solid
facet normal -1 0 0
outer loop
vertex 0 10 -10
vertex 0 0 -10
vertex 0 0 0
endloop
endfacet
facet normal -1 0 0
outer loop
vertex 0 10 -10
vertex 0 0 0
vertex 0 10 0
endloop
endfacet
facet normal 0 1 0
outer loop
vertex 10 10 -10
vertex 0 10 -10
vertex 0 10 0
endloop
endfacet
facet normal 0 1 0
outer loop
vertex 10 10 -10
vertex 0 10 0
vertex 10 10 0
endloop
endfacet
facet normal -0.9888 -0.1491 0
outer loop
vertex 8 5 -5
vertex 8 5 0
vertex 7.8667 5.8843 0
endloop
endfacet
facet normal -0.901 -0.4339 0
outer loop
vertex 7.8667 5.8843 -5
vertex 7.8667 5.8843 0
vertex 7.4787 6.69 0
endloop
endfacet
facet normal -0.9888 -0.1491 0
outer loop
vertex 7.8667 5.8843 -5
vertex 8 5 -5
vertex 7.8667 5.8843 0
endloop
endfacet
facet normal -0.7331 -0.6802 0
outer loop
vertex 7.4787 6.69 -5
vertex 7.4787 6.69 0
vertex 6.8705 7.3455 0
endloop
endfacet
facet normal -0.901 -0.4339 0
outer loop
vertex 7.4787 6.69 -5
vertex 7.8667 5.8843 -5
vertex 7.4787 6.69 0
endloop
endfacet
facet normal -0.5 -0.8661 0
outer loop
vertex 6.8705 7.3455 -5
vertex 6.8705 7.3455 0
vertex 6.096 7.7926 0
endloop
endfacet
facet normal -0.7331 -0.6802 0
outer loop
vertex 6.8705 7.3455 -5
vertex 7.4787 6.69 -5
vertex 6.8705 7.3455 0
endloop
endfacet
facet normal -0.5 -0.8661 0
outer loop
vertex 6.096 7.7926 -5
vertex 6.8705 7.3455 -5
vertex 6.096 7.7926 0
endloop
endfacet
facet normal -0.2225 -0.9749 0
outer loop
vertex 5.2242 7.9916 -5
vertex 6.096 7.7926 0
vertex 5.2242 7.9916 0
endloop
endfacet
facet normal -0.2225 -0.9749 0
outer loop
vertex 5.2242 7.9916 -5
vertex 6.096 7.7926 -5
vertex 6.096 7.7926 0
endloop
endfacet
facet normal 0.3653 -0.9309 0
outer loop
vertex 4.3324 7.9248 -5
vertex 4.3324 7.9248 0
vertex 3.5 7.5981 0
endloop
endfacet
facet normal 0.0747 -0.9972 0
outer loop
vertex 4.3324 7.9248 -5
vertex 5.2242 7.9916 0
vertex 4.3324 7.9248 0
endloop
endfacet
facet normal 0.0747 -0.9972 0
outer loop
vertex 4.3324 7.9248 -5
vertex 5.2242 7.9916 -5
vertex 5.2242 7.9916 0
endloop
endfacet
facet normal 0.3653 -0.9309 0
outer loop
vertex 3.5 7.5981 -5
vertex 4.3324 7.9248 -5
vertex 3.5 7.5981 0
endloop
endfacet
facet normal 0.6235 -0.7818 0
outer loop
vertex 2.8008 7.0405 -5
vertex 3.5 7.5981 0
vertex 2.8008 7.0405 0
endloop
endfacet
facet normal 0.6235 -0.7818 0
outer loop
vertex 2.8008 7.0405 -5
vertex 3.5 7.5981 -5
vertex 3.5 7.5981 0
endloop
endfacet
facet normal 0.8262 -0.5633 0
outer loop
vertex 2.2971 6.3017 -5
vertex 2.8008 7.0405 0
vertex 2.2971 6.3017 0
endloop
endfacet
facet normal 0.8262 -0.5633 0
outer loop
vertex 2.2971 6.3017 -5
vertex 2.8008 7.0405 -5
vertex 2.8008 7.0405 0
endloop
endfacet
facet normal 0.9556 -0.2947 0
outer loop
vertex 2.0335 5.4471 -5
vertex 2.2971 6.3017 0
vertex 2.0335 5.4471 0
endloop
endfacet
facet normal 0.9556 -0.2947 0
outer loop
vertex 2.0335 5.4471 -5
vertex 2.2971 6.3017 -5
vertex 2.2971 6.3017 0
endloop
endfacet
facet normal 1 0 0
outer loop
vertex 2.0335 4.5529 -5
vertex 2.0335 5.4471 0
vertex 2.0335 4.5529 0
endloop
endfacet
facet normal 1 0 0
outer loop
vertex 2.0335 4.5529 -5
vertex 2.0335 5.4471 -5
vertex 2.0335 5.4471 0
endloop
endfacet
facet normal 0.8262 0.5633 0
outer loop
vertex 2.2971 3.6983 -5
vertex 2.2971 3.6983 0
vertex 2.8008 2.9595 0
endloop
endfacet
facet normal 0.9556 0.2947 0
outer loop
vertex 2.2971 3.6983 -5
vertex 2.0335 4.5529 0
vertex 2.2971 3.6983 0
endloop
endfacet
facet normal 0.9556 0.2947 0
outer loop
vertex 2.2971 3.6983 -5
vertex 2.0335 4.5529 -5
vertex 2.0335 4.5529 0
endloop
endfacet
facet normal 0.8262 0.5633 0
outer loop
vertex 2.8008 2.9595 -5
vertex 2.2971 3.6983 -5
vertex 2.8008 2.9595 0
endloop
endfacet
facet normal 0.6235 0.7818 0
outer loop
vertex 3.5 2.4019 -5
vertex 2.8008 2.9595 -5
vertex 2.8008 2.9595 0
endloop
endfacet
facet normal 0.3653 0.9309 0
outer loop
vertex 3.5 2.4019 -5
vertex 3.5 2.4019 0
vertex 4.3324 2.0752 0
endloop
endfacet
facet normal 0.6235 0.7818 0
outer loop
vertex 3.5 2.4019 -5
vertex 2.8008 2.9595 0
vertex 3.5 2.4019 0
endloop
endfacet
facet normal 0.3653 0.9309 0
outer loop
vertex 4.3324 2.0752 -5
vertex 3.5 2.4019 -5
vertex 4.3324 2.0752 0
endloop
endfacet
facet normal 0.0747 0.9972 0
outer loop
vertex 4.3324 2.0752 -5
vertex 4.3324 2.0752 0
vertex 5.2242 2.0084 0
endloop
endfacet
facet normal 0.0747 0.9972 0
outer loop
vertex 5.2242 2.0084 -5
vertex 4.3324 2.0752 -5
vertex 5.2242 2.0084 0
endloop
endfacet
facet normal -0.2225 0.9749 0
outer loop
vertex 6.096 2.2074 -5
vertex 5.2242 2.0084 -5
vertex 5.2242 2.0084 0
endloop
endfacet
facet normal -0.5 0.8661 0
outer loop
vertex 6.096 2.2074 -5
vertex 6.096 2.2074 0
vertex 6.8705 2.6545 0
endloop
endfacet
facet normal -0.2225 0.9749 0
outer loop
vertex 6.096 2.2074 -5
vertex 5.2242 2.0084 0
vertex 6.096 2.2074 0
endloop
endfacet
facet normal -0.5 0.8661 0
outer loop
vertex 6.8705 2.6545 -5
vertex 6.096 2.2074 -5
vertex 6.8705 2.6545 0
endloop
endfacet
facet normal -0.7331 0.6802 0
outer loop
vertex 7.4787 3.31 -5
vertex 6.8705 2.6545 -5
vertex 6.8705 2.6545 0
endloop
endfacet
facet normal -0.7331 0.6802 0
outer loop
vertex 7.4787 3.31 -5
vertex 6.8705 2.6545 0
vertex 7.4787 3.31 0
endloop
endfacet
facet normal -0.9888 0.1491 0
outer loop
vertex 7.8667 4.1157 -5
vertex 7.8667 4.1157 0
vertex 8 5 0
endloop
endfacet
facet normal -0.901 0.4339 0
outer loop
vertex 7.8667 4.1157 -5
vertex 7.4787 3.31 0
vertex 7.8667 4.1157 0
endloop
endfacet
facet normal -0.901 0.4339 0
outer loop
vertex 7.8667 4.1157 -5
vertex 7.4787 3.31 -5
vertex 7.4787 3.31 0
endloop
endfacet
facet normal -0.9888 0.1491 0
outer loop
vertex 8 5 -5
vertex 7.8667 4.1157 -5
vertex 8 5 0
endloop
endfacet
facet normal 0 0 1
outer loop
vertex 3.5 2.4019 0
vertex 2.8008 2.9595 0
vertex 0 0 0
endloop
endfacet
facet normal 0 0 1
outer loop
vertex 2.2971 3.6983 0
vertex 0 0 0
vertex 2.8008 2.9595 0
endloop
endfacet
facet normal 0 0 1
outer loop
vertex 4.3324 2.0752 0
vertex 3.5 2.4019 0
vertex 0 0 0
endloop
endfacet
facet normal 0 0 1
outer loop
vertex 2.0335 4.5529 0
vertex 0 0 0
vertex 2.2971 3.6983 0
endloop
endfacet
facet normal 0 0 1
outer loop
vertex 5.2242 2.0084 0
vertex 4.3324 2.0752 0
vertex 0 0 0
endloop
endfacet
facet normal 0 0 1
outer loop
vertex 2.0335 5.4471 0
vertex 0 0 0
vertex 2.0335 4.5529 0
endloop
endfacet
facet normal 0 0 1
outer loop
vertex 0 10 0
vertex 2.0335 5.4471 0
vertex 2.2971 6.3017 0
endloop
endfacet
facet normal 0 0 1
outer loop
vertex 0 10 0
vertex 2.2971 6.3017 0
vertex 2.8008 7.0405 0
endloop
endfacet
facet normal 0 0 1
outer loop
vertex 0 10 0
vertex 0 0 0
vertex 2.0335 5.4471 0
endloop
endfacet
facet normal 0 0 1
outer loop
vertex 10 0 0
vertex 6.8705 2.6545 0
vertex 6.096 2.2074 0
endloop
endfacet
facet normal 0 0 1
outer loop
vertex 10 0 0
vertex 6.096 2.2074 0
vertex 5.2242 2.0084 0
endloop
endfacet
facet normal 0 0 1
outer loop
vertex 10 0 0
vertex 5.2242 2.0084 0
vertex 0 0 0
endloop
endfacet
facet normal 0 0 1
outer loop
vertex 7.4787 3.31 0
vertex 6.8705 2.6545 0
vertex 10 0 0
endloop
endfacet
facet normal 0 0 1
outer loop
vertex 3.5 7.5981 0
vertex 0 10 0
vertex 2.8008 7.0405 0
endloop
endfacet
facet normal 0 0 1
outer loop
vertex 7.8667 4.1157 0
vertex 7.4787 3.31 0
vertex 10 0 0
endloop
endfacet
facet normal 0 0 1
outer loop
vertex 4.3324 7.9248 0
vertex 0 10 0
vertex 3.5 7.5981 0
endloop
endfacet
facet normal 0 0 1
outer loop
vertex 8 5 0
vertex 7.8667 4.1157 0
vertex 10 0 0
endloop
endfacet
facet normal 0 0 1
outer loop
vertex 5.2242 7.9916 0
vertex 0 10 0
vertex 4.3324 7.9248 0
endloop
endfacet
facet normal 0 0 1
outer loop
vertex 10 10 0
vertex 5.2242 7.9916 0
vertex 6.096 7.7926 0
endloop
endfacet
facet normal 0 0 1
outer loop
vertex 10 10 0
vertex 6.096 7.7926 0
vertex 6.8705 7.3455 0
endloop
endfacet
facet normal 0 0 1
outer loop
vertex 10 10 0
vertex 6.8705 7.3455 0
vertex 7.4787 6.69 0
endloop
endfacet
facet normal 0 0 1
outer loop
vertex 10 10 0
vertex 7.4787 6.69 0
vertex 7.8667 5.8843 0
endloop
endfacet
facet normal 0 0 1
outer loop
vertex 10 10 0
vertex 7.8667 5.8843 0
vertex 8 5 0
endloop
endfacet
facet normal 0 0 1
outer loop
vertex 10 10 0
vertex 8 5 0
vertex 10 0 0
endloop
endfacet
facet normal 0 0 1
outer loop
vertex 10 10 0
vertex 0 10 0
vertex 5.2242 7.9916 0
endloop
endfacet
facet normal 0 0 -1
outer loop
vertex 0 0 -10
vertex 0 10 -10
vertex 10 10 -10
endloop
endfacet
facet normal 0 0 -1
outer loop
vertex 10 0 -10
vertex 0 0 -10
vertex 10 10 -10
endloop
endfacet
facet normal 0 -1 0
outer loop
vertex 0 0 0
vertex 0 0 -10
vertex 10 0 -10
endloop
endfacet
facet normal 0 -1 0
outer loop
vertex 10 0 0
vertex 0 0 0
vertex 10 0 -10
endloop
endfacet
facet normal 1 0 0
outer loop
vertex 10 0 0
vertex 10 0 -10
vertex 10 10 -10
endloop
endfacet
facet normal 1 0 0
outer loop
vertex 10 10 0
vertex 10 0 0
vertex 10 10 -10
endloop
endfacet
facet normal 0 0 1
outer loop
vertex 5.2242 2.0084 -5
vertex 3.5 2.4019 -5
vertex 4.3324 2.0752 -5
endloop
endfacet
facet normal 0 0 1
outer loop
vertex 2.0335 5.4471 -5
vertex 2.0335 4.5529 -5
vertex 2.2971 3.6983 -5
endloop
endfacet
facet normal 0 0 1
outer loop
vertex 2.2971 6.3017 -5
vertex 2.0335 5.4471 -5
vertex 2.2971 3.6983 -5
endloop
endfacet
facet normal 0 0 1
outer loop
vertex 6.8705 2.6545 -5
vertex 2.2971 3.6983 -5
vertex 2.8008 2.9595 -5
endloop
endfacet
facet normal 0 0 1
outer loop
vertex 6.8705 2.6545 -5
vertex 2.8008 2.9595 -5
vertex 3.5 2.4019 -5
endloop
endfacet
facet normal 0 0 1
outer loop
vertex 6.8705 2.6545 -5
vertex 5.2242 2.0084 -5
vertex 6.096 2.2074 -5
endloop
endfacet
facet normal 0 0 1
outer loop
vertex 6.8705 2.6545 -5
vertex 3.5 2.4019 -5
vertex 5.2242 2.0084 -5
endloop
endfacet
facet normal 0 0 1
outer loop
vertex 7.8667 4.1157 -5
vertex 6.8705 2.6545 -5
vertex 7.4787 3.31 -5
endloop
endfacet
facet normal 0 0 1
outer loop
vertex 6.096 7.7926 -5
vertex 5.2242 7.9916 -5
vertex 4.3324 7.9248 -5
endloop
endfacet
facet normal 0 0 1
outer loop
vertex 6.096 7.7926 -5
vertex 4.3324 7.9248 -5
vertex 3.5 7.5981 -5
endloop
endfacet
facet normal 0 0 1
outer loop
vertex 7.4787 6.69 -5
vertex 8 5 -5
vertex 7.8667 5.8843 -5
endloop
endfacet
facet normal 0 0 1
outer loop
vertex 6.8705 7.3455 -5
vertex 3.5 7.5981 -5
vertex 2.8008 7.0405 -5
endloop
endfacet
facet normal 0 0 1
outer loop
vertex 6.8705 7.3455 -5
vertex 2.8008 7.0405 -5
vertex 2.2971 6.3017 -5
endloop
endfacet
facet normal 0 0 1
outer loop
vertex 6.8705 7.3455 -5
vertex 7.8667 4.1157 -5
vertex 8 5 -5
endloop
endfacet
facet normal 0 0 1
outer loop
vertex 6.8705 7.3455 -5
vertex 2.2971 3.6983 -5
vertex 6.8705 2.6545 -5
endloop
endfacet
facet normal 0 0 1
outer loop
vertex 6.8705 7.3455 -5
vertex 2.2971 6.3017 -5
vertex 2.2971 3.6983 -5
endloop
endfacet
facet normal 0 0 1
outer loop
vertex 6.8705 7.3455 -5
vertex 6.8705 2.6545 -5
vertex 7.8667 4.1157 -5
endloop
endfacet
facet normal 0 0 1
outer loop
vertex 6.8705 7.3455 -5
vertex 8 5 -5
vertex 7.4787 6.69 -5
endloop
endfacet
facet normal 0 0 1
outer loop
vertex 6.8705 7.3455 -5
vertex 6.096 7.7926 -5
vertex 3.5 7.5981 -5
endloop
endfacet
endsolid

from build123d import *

# Parameters (mm, degrees)
CYLINDER_R     = 3
CYLINDER_DEPTH = 10
BOX_W          = 10
BOX_H          = 10
BOX_DEPTH      = 10


with BuildPart() as cylinder:
    # Cylinder → Cylinder (new body)
    with BuildSketch(Plane(origin=(5, 5, 5), x_dir=(1, 0, 0), z_dir=(0, 0, 1))):
        Circle(CYLINDER_R)
    extrude(amount=CYLINDER_DEPTH)


with BuildPart() as model_cut:
    # Box → Box (new body)
    with BuildSketch(Plane.XY):
        with Locations((5, 5)):
            Rectangle(BOX_W, BOX_H)
    extrude(amount=BOX_DEPTH)

    # Cut: cut Cylinder
    add(cylinder.part, mode=Mode.SUBTRACT)


with BuildPart() as model_cut_1:
    # Clone placement: moved
    add(model_cut.part.moved(Location((0, 0, -10))))


solid = model_cut_1.part
